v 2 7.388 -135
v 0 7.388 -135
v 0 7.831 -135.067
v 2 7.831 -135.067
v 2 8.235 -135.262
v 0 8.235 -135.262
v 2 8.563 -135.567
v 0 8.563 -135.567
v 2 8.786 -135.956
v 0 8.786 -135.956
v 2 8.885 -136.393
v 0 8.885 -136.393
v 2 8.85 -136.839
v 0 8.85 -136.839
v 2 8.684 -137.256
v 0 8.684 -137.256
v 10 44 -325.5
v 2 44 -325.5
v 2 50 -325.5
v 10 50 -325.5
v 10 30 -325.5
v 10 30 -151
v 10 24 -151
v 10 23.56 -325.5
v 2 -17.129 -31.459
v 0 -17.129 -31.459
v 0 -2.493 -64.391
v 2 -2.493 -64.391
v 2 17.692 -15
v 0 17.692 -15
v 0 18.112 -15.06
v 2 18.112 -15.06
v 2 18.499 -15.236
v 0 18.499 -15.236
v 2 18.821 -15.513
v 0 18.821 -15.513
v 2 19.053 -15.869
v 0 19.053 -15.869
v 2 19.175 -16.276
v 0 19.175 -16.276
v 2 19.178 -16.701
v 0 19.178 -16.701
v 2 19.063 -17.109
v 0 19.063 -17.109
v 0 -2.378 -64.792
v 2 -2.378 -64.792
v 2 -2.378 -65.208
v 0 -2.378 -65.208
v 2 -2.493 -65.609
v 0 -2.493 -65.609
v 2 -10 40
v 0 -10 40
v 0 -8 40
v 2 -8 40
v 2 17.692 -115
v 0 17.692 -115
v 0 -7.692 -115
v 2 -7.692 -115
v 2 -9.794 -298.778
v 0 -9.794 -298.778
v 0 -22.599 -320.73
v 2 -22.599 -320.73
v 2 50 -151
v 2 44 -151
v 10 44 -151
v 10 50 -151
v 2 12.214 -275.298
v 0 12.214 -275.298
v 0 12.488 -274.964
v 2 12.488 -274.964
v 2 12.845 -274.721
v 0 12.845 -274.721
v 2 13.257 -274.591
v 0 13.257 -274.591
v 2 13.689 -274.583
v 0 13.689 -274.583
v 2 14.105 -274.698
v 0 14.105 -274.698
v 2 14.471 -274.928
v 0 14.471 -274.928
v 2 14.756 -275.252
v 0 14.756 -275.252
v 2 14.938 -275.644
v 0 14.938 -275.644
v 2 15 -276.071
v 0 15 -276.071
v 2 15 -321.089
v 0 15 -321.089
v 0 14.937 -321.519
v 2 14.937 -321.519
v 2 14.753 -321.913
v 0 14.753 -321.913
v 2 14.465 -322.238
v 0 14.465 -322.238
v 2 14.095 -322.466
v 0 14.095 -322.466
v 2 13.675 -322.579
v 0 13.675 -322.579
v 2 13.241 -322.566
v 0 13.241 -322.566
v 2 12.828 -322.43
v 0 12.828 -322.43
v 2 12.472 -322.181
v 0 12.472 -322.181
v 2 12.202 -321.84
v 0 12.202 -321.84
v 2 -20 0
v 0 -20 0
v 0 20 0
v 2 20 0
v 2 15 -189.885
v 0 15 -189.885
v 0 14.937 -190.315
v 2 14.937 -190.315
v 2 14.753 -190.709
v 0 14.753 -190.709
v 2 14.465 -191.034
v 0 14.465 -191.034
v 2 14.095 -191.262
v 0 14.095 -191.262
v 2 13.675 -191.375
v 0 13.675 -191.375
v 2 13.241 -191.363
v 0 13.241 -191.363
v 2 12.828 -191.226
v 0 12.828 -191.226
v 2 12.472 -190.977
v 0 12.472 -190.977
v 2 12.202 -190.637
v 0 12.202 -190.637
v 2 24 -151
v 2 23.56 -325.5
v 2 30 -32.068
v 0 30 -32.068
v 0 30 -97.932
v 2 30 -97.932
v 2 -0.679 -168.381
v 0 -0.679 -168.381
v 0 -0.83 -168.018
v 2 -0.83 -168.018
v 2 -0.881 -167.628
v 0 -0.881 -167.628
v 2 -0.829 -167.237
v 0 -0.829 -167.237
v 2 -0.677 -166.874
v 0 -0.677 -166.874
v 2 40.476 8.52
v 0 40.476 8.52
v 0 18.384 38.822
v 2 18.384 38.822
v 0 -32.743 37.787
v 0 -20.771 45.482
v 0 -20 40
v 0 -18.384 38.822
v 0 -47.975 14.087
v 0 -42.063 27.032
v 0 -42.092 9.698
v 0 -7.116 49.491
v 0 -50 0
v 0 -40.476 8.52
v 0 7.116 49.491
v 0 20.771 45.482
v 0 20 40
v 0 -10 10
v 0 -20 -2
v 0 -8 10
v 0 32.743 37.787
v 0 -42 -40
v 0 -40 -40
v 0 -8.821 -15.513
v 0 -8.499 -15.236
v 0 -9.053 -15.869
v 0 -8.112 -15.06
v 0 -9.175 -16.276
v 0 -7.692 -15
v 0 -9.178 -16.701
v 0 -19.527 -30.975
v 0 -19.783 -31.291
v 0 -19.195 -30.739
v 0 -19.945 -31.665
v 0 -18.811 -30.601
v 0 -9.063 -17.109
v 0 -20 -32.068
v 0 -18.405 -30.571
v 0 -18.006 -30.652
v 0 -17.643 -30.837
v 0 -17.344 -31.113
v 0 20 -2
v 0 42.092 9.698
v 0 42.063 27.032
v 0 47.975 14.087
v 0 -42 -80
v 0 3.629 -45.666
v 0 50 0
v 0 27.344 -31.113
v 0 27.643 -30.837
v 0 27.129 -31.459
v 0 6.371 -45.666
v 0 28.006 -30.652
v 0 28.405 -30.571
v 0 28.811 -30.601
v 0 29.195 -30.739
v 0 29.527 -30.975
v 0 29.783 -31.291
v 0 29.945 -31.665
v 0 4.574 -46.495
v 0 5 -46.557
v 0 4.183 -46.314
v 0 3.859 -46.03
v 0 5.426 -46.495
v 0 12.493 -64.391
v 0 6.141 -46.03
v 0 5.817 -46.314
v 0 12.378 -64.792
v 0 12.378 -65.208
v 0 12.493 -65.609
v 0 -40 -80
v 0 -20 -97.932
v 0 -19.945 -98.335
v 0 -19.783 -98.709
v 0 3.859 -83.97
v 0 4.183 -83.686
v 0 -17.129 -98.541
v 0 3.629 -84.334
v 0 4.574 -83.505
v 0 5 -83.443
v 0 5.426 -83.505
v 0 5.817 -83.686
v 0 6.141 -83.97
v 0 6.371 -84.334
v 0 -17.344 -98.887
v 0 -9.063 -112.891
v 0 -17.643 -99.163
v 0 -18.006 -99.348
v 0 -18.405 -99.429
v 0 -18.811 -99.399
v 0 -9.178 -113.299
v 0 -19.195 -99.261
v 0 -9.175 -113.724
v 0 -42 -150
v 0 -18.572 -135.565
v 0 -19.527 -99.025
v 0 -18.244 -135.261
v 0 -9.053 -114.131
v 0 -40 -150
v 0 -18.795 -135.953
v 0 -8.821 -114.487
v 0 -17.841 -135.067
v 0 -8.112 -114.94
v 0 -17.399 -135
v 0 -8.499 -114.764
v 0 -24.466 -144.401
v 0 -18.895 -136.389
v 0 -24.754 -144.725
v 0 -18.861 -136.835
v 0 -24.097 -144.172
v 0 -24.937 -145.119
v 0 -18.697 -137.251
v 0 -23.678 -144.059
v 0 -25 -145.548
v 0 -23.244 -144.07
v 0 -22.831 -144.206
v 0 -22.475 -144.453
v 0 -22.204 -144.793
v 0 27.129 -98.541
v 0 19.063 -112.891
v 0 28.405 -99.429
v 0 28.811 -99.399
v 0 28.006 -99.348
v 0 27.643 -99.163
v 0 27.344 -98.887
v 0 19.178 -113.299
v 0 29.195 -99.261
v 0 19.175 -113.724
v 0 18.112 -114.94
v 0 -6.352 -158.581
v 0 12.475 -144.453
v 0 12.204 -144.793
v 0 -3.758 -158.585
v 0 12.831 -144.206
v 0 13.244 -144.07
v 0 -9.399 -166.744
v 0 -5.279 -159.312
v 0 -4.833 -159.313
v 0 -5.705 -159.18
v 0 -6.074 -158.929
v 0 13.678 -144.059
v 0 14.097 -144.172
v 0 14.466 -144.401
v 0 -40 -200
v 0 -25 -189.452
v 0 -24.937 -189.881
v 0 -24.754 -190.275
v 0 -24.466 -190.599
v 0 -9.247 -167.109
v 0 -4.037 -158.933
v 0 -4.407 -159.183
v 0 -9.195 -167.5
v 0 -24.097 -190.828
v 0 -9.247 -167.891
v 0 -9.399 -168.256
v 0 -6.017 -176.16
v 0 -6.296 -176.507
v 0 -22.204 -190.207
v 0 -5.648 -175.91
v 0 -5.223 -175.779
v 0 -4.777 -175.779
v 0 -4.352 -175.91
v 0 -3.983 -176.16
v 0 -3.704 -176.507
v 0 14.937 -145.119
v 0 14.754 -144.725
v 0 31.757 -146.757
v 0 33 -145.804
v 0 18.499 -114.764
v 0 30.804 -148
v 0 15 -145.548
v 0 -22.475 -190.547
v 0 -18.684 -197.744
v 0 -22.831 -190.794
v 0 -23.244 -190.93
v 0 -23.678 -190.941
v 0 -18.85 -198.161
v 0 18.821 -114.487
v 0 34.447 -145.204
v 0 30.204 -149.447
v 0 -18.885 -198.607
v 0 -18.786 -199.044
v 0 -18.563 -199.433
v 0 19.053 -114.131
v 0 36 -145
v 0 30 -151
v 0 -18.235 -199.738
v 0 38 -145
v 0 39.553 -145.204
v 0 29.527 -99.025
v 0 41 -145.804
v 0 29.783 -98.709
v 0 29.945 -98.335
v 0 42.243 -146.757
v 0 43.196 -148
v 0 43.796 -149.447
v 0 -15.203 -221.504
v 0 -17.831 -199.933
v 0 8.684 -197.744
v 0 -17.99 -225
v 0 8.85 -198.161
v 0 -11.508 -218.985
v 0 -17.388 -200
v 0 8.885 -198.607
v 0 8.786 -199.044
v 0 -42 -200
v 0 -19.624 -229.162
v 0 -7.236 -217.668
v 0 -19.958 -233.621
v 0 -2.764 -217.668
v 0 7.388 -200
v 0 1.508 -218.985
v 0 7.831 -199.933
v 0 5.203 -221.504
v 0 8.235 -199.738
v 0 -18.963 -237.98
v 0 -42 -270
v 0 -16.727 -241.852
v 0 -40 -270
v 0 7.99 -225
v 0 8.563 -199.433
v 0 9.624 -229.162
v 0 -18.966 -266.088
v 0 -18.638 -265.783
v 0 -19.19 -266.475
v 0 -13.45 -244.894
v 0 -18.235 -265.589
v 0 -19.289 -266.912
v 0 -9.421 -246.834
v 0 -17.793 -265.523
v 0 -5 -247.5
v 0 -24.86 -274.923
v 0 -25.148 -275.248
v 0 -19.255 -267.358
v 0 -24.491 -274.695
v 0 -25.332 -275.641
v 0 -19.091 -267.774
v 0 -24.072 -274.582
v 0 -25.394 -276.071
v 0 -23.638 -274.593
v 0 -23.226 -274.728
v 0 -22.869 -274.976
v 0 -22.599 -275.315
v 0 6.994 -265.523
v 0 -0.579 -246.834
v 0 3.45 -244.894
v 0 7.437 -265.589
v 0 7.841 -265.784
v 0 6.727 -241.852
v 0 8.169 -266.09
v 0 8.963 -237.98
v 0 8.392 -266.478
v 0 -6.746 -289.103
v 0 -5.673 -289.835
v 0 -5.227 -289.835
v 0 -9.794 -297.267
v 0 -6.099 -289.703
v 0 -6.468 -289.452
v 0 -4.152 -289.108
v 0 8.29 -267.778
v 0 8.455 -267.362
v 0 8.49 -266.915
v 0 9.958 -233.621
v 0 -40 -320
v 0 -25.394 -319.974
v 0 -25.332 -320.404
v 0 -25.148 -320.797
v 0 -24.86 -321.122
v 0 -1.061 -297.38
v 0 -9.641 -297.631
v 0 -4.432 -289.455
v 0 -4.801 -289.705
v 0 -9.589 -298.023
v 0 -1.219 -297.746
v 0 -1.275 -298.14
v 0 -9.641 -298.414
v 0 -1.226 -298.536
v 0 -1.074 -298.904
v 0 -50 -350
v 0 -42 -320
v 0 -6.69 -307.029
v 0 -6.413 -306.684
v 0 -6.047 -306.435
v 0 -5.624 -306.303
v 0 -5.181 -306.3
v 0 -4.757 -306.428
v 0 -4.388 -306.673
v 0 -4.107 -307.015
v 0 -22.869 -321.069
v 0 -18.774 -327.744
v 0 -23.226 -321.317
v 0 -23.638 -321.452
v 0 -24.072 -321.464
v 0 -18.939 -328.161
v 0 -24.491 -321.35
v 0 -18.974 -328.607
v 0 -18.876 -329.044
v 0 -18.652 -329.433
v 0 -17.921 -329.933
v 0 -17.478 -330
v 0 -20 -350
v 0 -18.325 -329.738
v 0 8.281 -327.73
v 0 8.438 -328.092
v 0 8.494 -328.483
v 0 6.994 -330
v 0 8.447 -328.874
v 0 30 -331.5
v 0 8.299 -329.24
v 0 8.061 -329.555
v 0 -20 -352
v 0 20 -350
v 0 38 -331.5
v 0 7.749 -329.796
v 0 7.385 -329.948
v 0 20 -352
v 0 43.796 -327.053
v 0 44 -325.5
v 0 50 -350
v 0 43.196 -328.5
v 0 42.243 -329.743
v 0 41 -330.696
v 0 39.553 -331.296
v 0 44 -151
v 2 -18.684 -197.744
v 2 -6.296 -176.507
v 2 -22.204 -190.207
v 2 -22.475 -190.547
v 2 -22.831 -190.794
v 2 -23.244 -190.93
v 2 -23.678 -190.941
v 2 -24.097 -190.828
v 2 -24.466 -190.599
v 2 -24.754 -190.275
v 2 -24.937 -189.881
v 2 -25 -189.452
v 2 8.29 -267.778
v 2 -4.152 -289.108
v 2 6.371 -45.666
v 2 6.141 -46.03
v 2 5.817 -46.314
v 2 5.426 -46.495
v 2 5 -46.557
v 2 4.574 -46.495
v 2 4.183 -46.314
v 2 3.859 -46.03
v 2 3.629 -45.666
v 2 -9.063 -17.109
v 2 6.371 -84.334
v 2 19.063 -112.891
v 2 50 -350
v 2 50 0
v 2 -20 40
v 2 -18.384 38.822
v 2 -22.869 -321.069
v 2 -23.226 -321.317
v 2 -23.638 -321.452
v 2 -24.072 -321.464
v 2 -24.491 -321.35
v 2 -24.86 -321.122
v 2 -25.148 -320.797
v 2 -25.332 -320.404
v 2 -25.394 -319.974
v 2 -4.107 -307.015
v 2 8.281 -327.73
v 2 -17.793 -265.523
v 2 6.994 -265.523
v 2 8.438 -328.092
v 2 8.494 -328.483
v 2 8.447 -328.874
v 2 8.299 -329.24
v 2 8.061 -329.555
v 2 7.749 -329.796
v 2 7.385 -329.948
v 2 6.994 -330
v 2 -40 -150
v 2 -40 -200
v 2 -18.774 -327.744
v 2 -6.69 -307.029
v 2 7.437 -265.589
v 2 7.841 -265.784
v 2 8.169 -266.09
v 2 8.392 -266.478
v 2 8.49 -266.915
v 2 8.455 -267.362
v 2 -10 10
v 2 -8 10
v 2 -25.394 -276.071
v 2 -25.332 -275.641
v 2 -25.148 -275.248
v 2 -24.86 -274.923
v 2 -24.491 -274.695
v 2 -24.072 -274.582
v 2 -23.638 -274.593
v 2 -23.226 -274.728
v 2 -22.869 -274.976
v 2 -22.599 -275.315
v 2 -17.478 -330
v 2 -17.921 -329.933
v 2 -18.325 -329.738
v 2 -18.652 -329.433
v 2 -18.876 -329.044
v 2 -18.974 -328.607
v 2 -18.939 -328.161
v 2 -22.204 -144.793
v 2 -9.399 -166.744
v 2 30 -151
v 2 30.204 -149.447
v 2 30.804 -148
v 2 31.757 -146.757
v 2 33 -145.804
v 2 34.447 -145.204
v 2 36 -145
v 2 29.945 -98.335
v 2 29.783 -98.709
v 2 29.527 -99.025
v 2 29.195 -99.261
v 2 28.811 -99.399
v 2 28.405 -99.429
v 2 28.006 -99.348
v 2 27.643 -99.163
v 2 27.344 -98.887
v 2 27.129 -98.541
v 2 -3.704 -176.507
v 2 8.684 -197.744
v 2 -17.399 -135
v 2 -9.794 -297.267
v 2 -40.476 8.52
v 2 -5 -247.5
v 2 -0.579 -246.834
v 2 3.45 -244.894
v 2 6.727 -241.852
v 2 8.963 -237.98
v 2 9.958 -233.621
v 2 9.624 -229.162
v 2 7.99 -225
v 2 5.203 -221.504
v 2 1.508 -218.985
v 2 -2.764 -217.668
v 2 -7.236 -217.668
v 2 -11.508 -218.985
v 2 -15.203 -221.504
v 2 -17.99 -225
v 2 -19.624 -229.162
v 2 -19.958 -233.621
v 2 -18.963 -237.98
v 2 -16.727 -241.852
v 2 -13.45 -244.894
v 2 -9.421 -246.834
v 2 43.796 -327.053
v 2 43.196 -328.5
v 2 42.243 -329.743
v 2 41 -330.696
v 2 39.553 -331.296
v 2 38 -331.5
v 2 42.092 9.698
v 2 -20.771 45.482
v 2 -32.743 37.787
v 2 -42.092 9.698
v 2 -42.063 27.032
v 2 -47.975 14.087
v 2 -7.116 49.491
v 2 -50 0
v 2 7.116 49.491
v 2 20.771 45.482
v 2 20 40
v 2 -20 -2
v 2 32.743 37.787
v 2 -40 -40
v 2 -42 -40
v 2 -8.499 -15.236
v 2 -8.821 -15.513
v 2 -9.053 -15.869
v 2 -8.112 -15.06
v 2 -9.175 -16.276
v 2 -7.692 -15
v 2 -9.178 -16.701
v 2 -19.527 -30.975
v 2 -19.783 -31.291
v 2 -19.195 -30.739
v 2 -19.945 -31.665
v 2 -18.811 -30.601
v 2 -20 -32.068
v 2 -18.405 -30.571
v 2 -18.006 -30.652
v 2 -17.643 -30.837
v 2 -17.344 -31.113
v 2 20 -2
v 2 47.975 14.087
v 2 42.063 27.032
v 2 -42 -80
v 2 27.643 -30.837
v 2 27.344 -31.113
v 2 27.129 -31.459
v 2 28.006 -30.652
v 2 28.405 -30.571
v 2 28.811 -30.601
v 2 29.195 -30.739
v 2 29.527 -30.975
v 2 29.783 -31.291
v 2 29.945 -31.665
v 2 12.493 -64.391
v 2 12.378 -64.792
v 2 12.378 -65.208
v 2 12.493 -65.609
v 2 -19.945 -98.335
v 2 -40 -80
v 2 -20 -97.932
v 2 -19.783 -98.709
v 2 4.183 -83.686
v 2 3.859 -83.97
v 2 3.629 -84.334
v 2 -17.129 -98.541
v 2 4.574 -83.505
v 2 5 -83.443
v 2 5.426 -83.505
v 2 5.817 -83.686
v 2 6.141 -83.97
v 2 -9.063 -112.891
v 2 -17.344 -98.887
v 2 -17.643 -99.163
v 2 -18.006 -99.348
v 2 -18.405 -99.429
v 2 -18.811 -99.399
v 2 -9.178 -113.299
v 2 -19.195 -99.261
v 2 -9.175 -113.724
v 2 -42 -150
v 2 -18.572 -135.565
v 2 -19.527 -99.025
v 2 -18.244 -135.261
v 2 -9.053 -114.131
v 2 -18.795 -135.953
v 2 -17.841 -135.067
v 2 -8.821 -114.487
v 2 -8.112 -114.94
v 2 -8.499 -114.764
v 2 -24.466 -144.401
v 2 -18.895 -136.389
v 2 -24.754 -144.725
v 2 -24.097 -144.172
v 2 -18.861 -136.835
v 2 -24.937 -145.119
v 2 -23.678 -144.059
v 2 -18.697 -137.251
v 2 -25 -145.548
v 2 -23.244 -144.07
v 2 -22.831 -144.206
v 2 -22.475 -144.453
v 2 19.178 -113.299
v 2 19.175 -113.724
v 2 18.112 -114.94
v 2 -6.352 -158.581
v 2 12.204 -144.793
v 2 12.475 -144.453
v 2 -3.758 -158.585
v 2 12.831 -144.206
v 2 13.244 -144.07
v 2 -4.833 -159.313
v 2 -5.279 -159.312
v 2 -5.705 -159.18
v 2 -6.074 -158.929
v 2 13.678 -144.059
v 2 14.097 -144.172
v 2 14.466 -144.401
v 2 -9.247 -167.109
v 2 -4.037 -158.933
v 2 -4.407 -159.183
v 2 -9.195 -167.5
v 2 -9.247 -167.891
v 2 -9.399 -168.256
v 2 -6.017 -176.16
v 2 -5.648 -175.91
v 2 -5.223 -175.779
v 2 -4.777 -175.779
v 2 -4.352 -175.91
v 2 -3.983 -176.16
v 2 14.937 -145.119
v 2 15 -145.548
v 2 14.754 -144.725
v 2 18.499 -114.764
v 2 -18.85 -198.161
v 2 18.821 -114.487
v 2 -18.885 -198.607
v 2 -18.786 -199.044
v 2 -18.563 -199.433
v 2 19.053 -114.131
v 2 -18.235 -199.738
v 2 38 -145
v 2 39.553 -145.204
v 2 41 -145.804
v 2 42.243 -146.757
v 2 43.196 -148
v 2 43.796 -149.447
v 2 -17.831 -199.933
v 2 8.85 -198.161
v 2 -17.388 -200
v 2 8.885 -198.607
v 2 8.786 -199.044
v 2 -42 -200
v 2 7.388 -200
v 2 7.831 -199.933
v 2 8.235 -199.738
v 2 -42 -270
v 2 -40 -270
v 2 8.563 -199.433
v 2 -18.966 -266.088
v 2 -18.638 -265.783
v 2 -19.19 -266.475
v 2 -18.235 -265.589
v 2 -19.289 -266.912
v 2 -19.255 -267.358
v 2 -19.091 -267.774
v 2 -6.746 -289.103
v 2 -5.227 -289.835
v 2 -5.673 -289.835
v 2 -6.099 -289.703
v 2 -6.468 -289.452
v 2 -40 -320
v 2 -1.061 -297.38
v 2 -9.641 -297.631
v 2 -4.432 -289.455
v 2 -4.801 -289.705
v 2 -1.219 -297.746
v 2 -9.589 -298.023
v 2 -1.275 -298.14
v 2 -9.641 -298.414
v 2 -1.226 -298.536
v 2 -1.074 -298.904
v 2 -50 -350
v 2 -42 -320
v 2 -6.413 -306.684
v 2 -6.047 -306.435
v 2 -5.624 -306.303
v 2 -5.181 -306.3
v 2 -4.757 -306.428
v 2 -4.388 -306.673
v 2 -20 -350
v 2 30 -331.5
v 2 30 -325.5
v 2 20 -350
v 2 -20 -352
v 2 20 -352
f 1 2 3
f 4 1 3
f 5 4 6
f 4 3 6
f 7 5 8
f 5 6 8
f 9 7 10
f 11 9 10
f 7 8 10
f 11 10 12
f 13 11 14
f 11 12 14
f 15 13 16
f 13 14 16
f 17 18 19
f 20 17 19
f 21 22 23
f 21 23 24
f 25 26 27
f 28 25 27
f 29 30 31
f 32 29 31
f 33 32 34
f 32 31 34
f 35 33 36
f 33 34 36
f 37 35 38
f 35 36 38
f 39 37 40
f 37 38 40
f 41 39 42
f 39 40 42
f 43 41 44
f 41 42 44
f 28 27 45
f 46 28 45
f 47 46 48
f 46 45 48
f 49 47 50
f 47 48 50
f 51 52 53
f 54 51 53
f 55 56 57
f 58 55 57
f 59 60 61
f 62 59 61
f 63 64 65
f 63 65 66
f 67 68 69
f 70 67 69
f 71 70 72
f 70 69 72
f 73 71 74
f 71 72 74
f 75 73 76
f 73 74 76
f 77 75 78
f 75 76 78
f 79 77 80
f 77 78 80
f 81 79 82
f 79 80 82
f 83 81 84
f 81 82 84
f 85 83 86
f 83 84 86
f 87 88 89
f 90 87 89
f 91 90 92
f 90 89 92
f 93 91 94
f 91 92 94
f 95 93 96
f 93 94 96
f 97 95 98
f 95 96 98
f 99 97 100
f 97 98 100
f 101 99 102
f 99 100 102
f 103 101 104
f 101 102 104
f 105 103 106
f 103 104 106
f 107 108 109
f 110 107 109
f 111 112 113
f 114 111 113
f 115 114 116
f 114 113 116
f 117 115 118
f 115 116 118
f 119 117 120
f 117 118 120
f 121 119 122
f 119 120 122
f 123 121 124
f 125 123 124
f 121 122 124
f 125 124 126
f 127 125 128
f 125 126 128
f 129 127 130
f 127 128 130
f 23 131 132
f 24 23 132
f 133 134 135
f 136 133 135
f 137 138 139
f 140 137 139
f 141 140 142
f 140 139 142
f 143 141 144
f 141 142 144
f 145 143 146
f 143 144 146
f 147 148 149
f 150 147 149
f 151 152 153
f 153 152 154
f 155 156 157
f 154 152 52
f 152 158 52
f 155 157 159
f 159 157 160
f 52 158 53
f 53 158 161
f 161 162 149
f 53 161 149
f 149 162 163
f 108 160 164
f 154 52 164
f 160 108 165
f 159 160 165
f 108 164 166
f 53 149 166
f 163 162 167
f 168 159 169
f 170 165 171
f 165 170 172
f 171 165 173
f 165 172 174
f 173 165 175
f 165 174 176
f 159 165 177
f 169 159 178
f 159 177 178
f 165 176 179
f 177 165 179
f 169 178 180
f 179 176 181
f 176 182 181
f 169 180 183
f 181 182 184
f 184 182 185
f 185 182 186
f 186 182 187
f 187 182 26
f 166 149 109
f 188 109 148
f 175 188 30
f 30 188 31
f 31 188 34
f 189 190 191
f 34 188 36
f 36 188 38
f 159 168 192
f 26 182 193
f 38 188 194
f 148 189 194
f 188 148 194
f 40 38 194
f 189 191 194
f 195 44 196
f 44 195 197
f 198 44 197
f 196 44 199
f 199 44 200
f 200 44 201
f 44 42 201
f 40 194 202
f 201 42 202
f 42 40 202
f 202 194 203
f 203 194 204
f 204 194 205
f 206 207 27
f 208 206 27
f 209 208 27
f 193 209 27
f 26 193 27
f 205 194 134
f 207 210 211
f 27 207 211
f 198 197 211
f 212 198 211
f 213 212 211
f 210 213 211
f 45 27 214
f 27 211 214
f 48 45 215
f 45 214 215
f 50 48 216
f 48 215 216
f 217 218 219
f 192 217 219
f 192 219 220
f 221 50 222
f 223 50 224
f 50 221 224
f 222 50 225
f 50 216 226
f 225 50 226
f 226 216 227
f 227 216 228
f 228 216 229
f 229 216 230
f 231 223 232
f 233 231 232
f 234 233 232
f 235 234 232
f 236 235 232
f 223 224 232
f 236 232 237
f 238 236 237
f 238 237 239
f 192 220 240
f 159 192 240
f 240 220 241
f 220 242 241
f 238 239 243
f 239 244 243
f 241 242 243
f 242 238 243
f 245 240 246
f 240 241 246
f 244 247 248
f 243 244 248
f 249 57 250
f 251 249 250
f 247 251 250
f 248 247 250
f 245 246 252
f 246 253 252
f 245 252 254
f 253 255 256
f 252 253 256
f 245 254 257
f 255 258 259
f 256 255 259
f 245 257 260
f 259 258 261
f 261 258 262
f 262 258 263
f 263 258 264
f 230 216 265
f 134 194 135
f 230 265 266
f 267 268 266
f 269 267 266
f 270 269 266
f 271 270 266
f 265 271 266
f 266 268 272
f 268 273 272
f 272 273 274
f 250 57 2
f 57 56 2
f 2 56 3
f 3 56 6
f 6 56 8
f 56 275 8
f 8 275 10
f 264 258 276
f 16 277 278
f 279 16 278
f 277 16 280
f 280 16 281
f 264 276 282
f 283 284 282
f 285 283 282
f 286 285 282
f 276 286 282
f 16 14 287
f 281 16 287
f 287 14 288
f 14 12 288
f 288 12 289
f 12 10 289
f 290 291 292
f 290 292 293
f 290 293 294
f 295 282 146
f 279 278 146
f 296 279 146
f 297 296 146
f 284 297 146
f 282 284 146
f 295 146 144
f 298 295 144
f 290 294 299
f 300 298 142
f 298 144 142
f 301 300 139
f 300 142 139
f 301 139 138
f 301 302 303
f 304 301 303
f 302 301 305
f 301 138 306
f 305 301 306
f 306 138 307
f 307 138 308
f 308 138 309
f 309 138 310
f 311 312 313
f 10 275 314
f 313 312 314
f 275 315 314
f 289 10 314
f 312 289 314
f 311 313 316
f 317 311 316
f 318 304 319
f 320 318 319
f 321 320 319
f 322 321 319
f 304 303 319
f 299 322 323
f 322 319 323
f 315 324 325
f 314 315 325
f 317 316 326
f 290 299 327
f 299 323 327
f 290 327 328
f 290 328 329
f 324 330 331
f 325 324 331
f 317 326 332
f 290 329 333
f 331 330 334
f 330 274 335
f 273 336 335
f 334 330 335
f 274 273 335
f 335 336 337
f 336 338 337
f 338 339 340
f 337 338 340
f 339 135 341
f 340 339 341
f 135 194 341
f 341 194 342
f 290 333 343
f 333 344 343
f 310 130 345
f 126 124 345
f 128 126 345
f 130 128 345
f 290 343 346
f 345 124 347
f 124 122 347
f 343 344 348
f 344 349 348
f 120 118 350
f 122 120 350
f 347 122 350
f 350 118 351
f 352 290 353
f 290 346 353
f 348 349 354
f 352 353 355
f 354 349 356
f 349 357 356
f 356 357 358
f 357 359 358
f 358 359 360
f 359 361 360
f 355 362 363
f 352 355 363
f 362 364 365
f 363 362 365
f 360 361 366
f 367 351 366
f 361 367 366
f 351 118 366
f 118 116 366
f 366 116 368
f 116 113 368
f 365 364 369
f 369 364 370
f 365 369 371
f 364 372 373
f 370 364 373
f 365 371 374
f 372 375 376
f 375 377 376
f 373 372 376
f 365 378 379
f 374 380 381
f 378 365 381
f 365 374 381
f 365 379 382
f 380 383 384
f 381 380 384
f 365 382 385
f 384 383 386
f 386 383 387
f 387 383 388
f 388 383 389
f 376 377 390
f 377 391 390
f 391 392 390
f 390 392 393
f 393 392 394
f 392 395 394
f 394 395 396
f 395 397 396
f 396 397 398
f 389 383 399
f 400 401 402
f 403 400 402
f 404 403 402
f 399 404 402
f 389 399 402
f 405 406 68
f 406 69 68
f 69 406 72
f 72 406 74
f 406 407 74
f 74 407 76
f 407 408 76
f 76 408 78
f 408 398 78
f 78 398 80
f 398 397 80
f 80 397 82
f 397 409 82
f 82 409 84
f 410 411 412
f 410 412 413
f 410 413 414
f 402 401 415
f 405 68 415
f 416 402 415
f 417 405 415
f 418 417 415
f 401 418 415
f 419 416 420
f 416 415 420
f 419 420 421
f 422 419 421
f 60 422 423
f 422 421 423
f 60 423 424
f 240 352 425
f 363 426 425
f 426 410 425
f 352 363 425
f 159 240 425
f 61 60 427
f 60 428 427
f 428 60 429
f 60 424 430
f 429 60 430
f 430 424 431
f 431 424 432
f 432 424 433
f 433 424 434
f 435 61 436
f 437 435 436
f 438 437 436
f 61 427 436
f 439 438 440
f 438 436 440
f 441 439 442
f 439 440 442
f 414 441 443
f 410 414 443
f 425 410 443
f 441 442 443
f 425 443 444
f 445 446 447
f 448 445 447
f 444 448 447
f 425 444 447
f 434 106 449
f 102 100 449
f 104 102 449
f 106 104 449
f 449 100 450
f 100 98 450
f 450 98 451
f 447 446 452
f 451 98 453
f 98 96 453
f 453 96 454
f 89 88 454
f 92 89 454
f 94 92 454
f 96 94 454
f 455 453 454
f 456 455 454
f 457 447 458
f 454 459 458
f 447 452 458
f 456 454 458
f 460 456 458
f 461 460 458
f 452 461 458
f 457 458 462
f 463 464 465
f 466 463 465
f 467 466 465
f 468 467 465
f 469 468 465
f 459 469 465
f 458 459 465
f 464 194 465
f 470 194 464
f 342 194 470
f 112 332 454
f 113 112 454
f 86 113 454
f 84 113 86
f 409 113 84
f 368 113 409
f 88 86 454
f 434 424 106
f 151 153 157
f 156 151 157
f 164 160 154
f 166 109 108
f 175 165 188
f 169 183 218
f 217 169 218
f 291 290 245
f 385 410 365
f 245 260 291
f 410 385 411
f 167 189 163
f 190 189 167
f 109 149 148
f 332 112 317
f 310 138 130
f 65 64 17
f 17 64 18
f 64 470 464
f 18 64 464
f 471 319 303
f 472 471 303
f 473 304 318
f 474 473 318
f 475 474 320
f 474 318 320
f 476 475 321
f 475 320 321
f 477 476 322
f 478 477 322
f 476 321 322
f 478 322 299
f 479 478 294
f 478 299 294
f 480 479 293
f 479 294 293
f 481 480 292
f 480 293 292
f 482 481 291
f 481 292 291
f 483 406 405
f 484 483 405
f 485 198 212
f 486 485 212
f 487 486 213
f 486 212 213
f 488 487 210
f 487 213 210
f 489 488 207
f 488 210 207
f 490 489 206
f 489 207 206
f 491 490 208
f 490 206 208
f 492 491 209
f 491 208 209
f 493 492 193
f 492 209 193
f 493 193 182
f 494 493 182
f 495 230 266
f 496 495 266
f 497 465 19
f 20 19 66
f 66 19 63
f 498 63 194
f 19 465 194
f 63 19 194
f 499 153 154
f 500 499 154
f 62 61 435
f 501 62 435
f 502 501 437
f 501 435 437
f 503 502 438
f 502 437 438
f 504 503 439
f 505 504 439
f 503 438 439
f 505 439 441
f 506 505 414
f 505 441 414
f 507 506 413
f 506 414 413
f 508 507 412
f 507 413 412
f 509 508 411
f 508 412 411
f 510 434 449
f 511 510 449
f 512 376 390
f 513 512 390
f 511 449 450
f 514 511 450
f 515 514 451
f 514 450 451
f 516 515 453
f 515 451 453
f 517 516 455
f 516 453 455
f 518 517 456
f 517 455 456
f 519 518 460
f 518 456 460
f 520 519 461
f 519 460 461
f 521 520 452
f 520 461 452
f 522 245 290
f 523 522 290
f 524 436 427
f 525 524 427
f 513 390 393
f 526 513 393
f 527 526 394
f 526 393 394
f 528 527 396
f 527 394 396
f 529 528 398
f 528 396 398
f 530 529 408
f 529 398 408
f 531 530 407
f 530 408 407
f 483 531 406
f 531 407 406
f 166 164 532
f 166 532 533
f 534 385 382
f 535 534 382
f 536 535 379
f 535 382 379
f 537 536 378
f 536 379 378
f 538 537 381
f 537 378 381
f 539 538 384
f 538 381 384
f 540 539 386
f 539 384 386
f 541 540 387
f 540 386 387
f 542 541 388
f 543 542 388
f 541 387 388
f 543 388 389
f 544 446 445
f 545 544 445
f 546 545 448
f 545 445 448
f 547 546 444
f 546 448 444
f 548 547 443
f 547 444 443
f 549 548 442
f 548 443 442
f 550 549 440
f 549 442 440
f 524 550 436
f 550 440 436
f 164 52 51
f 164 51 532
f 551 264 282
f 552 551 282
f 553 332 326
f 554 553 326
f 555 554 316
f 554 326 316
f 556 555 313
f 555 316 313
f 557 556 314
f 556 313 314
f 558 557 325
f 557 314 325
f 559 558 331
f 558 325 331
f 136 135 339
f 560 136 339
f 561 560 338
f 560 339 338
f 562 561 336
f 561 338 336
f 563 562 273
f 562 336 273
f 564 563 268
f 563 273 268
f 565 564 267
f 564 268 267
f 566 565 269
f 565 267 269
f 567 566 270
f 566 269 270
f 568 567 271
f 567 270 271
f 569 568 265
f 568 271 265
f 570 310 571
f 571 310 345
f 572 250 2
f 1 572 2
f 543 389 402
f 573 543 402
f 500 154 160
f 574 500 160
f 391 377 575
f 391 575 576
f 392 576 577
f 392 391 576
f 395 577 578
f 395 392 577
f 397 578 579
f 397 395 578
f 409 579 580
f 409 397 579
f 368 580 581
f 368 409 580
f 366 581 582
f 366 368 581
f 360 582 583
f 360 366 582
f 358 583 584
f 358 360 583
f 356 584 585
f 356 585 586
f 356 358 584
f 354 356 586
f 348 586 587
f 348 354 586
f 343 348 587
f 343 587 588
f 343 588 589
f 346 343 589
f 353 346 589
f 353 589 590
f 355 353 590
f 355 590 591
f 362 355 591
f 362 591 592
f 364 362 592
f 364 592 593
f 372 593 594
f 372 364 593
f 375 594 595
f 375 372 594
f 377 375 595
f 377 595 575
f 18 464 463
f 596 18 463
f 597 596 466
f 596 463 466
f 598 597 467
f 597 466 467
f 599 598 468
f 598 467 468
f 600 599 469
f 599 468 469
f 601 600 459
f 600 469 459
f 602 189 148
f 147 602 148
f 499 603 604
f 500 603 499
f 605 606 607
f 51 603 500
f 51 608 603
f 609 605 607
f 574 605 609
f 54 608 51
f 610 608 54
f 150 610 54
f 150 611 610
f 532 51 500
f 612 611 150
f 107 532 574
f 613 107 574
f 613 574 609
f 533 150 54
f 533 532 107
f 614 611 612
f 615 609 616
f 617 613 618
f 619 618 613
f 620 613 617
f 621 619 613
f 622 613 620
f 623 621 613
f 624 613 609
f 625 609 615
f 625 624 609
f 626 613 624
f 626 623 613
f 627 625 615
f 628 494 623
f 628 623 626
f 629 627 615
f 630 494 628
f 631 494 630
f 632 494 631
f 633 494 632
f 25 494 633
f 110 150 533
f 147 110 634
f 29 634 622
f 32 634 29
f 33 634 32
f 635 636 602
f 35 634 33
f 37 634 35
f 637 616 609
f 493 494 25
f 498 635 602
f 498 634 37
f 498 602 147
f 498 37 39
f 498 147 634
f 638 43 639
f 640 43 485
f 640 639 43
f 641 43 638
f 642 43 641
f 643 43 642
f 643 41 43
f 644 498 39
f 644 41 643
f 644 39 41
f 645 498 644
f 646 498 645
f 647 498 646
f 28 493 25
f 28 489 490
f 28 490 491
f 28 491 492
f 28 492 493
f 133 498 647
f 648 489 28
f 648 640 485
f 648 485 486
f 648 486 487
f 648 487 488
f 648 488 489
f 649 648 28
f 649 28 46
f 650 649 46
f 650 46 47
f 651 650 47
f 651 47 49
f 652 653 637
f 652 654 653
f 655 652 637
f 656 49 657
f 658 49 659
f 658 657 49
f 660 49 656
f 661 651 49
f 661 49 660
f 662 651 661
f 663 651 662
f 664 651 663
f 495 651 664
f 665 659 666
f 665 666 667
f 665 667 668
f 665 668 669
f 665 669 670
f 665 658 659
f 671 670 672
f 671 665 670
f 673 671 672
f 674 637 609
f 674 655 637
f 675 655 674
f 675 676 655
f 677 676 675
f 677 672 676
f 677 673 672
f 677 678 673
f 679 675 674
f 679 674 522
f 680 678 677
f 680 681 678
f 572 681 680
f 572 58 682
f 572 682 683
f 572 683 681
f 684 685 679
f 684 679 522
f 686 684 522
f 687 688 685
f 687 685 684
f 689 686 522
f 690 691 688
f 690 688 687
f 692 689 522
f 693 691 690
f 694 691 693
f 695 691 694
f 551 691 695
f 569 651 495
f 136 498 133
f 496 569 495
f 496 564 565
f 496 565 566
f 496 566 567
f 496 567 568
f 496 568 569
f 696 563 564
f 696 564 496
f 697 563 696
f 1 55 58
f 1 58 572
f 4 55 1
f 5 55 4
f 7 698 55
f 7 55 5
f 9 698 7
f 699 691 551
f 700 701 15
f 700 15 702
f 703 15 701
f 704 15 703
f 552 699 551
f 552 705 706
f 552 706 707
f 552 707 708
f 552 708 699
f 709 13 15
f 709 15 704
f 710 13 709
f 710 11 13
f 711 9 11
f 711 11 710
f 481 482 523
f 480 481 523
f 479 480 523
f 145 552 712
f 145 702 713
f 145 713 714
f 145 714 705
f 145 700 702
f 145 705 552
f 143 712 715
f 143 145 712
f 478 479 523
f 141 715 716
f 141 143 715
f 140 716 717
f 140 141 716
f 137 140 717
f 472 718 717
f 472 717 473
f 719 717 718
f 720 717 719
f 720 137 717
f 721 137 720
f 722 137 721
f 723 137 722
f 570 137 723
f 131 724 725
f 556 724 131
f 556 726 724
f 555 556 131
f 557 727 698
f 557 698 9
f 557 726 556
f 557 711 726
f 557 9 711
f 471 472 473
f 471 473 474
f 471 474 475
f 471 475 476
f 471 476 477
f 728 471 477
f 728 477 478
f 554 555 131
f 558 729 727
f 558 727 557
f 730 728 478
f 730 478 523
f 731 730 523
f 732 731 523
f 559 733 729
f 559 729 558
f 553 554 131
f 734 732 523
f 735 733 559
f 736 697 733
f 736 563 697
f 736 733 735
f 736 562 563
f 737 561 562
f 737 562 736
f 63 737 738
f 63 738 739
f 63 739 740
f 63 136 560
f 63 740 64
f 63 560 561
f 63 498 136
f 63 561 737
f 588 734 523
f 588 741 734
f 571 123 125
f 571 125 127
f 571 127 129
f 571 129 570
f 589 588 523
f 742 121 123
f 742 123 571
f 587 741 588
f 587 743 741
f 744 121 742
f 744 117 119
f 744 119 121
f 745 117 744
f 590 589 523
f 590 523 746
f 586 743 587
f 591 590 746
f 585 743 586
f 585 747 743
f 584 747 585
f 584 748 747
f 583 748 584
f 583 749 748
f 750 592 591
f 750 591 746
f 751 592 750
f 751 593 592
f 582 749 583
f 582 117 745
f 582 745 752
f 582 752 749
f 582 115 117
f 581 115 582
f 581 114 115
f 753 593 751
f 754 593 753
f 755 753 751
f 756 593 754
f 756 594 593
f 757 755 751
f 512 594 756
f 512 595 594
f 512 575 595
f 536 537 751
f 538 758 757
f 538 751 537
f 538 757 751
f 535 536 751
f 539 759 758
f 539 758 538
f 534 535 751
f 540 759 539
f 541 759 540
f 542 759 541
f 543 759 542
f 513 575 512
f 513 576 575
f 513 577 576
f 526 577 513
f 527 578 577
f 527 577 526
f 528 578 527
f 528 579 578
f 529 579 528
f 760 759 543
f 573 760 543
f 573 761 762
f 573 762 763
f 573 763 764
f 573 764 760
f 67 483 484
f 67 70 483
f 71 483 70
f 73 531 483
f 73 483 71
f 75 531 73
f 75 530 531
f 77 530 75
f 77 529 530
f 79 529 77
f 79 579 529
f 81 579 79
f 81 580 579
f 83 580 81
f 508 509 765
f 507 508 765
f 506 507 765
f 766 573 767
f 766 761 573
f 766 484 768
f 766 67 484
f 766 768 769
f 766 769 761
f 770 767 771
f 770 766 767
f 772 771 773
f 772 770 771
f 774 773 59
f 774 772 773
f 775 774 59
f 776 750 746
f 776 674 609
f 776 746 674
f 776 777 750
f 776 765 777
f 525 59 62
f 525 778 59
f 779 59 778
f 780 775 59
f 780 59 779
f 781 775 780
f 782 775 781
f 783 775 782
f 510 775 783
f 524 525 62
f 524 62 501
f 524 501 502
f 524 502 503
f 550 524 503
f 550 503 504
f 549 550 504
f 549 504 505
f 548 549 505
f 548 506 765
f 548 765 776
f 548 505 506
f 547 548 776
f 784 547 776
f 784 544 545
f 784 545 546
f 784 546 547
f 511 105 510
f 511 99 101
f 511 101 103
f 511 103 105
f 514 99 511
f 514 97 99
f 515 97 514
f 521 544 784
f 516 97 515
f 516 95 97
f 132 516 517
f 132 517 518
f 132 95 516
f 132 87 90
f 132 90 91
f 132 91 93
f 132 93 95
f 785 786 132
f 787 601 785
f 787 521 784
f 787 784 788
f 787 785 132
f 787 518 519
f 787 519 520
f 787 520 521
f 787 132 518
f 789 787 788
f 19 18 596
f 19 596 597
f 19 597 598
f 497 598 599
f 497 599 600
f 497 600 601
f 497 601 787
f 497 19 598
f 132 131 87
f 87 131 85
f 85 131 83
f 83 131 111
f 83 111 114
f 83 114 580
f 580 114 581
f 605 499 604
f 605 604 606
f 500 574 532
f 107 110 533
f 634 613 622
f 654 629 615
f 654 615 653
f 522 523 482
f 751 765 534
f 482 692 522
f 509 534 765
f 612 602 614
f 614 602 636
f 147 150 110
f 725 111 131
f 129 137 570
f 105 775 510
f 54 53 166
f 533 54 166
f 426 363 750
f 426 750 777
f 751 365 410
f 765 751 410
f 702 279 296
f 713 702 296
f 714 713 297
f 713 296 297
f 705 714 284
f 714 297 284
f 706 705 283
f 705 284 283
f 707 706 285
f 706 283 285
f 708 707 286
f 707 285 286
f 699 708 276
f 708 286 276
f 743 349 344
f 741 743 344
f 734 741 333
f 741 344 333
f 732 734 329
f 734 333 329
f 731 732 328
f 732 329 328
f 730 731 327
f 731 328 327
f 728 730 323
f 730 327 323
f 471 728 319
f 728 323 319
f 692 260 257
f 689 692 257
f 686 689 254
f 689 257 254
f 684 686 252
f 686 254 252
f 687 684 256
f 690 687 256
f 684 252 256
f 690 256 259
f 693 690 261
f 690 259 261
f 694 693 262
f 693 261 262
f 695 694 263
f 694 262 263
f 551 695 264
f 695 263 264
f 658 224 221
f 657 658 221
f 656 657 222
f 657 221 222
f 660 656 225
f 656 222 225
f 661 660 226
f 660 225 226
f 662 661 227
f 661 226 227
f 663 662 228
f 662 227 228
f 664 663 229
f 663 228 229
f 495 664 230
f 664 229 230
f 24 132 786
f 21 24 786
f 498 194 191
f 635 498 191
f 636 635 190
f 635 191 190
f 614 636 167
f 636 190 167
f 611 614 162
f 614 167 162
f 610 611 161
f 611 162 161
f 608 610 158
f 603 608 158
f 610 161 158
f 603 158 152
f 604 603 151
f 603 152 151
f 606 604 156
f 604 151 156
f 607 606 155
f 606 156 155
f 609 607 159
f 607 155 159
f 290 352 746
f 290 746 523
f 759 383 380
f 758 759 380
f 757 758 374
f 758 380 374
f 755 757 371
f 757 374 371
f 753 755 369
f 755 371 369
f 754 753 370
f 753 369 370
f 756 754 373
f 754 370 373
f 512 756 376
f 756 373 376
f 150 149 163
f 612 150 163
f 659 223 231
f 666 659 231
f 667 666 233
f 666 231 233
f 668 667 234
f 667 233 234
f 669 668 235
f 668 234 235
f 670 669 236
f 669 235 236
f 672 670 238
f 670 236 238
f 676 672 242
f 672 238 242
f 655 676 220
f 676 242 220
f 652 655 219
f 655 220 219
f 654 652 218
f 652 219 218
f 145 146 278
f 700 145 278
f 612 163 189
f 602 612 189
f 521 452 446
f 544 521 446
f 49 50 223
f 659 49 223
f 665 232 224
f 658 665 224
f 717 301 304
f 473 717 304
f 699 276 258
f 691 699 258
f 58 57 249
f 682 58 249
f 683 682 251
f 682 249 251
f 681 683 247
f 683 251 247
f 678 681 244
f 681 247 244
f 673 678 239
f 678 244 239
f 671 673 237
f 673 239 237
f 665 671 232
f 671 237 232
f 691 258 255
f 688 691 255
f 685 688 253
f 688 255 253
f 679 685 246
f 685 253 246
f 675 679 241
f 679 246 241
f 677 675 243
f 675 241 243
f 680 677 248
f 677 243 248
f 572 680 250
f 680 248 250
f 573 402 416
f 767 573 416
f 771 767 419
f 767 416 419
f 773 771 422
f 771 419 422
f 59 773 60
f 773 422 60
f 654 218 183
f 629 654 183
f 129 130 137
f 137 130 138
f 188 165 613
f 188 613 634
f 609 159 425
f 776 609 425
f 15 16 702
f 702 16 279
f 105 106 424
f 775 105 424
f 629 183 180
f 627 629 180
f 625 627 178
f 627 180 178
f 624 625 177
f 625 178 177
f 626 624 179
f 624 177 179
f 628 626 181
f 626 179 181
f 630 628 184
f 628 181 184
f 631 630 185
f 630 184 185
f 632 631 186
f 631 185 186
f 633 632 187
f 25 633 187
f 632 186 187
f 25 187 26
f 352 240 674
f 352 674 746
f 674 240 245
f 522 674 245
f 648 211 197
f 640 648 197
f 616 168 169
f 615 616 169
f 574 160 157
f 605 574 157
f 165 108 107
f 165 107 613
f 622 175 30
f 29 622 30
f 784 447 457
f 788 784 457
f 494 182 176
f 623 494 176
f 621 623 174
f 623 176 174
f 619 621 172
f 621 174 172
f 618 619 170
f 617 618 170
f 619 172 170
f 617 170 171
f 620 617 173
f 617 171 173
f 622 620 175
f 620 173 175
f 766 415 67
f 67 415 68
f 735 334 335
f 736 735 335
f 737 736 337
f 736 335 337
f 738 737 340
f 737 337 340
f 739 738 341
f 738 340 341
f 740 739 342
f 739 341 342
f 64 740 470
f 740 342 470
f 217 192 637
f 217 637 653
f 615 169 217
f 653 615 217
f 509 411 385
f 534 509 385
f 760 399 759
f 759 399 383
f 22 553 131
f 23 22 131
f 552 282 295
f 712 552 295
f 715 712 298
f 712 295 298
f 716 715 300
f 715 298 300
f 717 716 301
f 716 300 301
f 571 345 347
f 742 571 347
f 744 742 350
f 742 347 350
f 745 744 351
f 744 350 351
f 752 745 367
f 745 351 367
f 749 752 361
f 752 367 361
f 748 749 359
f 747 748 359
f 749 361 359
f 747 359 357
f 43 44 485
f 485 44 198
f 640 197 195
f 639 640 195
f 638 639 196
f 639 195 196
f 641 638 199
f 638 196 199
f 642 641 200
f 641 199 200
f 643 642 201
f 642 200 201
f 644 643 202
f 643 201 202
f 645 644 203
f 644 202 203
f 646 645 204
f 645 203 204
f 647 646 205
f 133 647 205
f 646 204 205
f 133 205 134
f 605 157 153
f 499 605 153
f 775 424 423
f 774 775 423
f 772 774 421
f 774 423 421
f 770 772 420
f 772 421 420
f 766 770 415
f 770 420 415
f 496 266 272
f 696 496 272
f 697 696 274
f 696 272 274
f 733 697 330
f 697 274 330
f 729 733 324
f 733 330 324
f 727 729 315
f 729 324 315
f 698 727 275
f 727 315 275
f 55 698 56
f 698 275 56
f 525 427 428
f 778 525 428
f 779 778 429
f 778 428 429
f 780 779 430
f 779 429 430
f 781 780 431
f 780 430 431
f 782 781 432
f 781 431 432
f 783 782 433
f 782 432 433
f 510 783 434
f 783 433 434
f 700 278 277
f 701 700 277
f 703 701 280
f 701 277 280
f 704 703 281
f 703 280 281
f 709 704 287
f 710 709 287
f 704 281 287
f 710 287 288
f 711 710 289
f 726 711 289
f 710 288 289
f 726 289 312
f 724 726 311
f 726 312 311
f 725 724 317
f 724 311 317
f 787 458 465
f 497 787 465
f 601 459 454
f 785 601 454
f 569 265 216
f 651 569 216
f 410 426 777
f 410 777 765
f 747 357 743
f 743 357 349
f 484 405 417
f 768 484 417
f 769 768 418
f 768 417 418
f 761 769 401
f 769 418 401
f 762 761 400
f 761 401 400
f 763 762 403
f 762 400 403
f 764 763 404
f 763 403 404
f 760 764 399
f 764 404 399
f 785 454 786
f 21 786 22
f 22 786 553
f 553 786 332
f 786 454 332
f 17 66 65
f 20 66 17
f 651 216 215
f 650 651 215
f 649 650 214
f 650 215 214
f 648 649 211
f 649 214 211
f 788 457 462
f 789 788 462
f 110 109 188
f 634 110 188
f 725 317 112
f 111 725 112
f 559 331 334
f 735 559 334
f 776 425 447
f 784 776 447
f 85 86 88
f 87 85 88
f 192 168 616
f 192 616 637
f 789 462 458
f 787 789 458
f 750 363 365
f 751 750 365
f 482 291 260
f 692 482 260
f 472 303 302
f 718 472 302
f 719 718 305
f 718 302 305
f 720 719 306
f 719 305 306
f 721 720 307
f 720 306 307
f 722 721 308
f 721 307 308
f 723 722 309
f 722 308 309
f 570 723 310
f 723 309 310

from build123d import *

# Parameters (mm, degrees)
SKETCH_1_W      = 2
SKETCH_1_H      = 40
SKETCH_1_W_2    = 40
SKETCH_1_H_2    = 2
SKETCH_1_W_3    = 50
SKETCH_1_R      = 15
SKETCH_1_W_4    = 30
EXTRUDE_3_DEPTH = 2
SKETCH_2_W      = 174.5
SKETCH_2_H      = 6
EXTRUDE_4_DEPTH = 10


with BuildPart() as part:
    # 草图1 → 凸台-拉伸3 (new body)
    with BuildSketch(Plane(origin=(0, 0, 0), x_dir=(0, 0, -1), z_dir=(1, 0, 0))):
        with BuildLine():
            Line((350, 50), (0, 50))
            ThreePointArc((0, 50), (-50, 0), (0, -50))
            Line((0, -50), (350, -50))
            Line((350, -50), (350, -20))
            Line((350, -20), (352, -20))
            Line((352, -20), (352, 20))
            Line((352, 20), (350, 20))
            Line((350, 20), (350, 50))
        make_face()
        with BuildLine():
            ThreePointArc((145, 38), (146.757359313, 42.242640687), (151, 44))
            Line((151, 44), (325.5, 44))
            ThreePointArc((325.5, 44), (329.742640687, 42.242640687), (331.5, 38))
            Line((331.5, 38), (331.5, 30))
            Line((331.5, 30), (151, 30))
            ThreePointArc((151, 30), (146.757359313, 31.757359313), (145, 36))
            Line((145, 36), (145, 38))
        make_face(mode=Mode.SUBTRACT)
        with Locations((1, 0)):
            Rectangle(SKETCH_1_W, SKETCH_1_H, mode=Mode.SUBTRACT)
        with Locations((60, -41)):
            Rectangle(SKETCH_1_W_2, SKETCH_1_H_2, mode=Mode.SUBTRACT)
        with BuildLine():
            Line((97.931678324, -20), (32.068321676, -20))
            ThreePointArc((32.068321676, -20), (30.600998265, -18.811387231), (31.459113977, -17.129282677))
            Line((31.459113977, -17.129282677), (64.390792301, -2.4929812))
            ThreePointArc((64.390792301, -2.4929812), (65, -2.363698523), (65.609207699, -2.4929812))
            Line((65.609207699, -2.4929812), (98.540886023, -17.129282677))
            ThreePointArc((98.540886023, -17.129282677), (99.399001735, -18.811387231), (97.931678324, -20))
        make_face(mode=Mode.SUBTRACT)
        with BuildLine():
            Line((135, -17.39868764), (135, 7.388444501))
            ThreePointArc((135, 7.388444501), (135.75290891, 8.68915773), (137.255806538, 8.684112853))
            Line((137.255806538, 8.684112853), (158.585016393, -3.757926229))
            ThreePointArc((158.585016393, -3.757926229), (159.329207689, -5.056143052), (158.580609404, -6.35182365))
            Line((158.580609404, -6.35182365), (137.25139955, -18.69691671))
            ThreePointArc((137.25139955, -18.69691671), (135.750700102, -18.698129698), (135, -17.39868764))
        make_face(mode=Mode.SUBTRACT)
        with Locations((175, -41)):
            Rectangle(SKETCH_1_W_3, SKETCH_1_H_2, mode=Mode.SUBTRACT)
        with Locations((295, -41)):
            Rectangle(SKETCH_1_W_3, SKETCH_1_H_2, mode=Mode.SUBTRACT)
        with BuildLine():
            Line((189.451619145, -25), (145.548380855, -25))
            ThreePointArc((145.548380855, -25), (144.100364535, -23.891469969), (144.792574317, -22.204331649))
            Line((144.792574317, -22.204331649), (166.744193462, -9.399220481))
            ThreePointArc((166.744193462, -9.399220481), (167.5, -9.194888832), (168.255806538, -9.399220481))
            Line((168.255806538, -9.399220481), (190.207425683, -22.204331649))
            ThreePointArc((190.207425683, -22.204331649), (190.899635465, -23.891469969), (189.451619145, -25))
        make_face(mode=Mode.SUBTRACT)
        with BuildLine():
            ThreePointArc((197.744193462, 8.684112853), (199.24709109, 8.68915773), (200, 7.388444501))
            Line((200, 7.388444501), (200, -17.388444501))
            ThreePointArc((200, -17.388444501), (199.24709109, -18.68915773), (197.744193462, -18.684112853))
            Line((197.744193462, -18.684112853), (176.506860031, -6.295668351))
            ThreePointArc((176.506860031, -6.295668351), (175.762666569, -5), (176.506860031, -3.704331649))
            Line((176.506860031, -3.704331649), (197.744193462, 8.684112853))
        make_face(mode=Mode.SUBTRACT)
        with Locations((232.5, -5)):
            Circle(SKETCH_1_R, mode=Mode.SUBTRACT)
        with BuildLine():
            Line((319.974166797, -25.394327939), (276.070928507, -25.394327939))
            ThreePointArc((276.070928507, -25.394327939), (274.622912187, -24.285797907), (275.315121969, -22.598659587))
            Line((275.315121969, -22.598659587), (297.266741114, -9.793548419))
            ThreePointArc((297.266741114, -9.793548419), (298.022547652, -9.589216771), (298.778354191, -9.793548419))
            Line((298.778354191, -9.793548419), (320.729973336, -22.598659587))
            ThreePointArc((320.729973336, -22.598659587), (321.422183118, -24.285797907), (319.974166797, -25.394327939))
        make_face(mode=Mode.SUBTRACT)
        with BuildLine():
            Line((265.522547652, -17.793015579), (265.522547652, 6.994116563))
            ThreePointArc((265.522547652, 6.994116563), (266.275456563, 8.294829792), (267.778354191, 8.289784914))
            Line((267.778354191, 8.289784914), (289.107564045, -4.152254168))
            ThreePointArc((289.107564045, -4.152254168), (289.851755342, -5.45047099), (289.103157056, -6.746151588))
            Line((289.103157056, -6.746151588), (267.773947202, -19.091244648))
            ThreePointArc((267.773947202, -19.091244648), (266.273247754, -19.092457637), (265.522547652, -17.793015579))
        make_face(mode=Mode.SUBTRACT)
        with BuildLine():
            ThreePointArc((327.730104505, 8.28146303), (329.239985391, 8.298885363), (330, 6.994116563))
            Line((330, 6.994116563), (330, -17.477952976))
            ThreePointArc((330, -17.477952976), (329.24709109, -18.778666205), (327.744193462, -18.773621327))
            Line((327.744193462, -18.773621327), (307.029407683, -6.68999629))
            ThreePointArc((307.029407683, -6.68999629), (306.285236534, -5.40250951), (307.015318726, -4.106981472))
            Line((307.015318726, -4.106981472), (327.730104505, 8.28146303))
        make_face(mode=Mode.SUBTRACT)
        with BuildLine():
            Line((15, -7.691857033), (15, 17.691857033))
            ThreePointArc((15, 17.691857033), (15.682629689, 18.94959539), (17.109207699, 19.062574356))
            Line((17.109207699, 19.062574356), (45.665886023, 6.370717323))
            ThreePointArc((45.665886023, 6.370717323), (46.556678324, 5), (45.665886023, 3.629282677))
            Line((45.665886023, 3.629282677), (17.109207699, -9.062574356))
            ThreePointArc((17.109207699, -9.062574356), (15.682629689, -8.94959539), (15, -7.691857033))
        make_face(mode=Mode.SUBTRACT)
        with BuildLine():
            Line((112.890792301, -9.062574356), (84.334113977, 3.629282677))
            ThreePointArc((84.334113977, 3.629282677), (83.443321676, 5), (84.334113977, 6.370717323))
            Line((84.334113977, 6.370717323), (112.890792301, 19.062574356))
            ThreePointArc((112.890792301, 19.062574356), (114.317370311, 18.94959539), (115, 17.691857033))
            Line((115, 17.691857033), (115, -7.691857033))
            ThreePointArc((115, -7.691857033), (114.317370311, -8.94959539), (112.890792301, -9.062574356))
        make_face(mode=Mode.SUBTRACT)
        with BuildLine():
            ThreePointArc((31.459113977, 27.129282677), (30.600998265, 28.811387231), (32.068321676, 30))
            Line((32.068321676, 30), (97.931678324, 30))
            ThreePointArc((97.931678324, 30), (99.399001735, 28.811387231), (98.540886023, 27.129282677))
            Line((98.540886023, 27.129282677), (65.609207699, 12.4929812))
            ThreePointArc((65.609207699, 12.4929812), (65, 12.363698523), (64.390792301, 12.4929812))
            Line((64.390792301, 12.4929812), (31.459113977, 27.129282677))
        make_face(mode=Mode.SUBTRACT)
        with BuildLine():
            ThreePointArc((144.792574317, 12.204331649), (144.100364535, 13.891469969), (145.548380855, 15))
            Line((145.548380855, 15), (189.885145799, 15))
            ThreePointArc((189.885145799, 15), (191.333825129, 13.889009252), (190.636545348, 12.20177093))
            Line((190.636545348, 12.20177093), (168.381459159, -0.679208343))
            ThreePointArc((168.381459159, -0.679208343), (167.627511138, -0.880977109), (166.874253072, -0.676647625))
            Line((166.874253072, -0.676647625), (144.792574317, 12.204331649))
        make_face(mode=Mode.SUBTRACT)
        with BuildLine():
            ThreePointArc((275.298059327, 12.21443661), (274.625531488, 13.901032988), (276.070928507, 15))
            Line((276.070928507, 15), (321.088992758, 15))
            ThreePointArc((321.088992758, 15), (322.537672089, 13.889009252), (321.840392308, 12.20177093))
            Line((321.840392308, 12.20177093), (298.904006812, -1.073536282))
            ThreePointArc((298.904006812, -1.073536282), (298.140143671, -1.275255431), (297.379738082, -1.060870603))
            Line((297.379738082, -1.060870603), (275.298059327, 12.21443661))
        make_face(mode=Mode.SUBTRACT)
        Polygon((-40, 20), (-9.698170842, 42.091834457), (-8.519939671, 40.475736902), (-38.821768829, 18.383902445), align=None, mode=Mode.SUBTRACT)
        with Locations((-25, -9)):
            Rectangle(SKETCH_1_W_4, SKETCH_1_H_2, mode=Mode.SUBTRACT)
        Polygon((-40, -20), (-38.821768829, -18.383902445), (-8.519939671, -40.475736902), (-9.698170842, -42.091834457), align=None, mode=Mode.SUBTRACT)
    extrude(amount=EXTRUDE_3_DEPTH)

    # 草图2 → 凸台-拉伸4 (add)
    with BuildSketch(Plane(origin=(0, 0, 0), x_dir=(0, 0, -1), z_dir=(1, 0, 0))):
        with Locations((238.25, 47)):
            Rectangle(SKETCH_2_W, SKETCH_2_H)
        Polygon((151, 30), (151, 24), (325.5, 23.560383637), (325.5, 30), align=None)
    extrude(amount=EXTRUDE_4_DEPTH)


solid = part.part
